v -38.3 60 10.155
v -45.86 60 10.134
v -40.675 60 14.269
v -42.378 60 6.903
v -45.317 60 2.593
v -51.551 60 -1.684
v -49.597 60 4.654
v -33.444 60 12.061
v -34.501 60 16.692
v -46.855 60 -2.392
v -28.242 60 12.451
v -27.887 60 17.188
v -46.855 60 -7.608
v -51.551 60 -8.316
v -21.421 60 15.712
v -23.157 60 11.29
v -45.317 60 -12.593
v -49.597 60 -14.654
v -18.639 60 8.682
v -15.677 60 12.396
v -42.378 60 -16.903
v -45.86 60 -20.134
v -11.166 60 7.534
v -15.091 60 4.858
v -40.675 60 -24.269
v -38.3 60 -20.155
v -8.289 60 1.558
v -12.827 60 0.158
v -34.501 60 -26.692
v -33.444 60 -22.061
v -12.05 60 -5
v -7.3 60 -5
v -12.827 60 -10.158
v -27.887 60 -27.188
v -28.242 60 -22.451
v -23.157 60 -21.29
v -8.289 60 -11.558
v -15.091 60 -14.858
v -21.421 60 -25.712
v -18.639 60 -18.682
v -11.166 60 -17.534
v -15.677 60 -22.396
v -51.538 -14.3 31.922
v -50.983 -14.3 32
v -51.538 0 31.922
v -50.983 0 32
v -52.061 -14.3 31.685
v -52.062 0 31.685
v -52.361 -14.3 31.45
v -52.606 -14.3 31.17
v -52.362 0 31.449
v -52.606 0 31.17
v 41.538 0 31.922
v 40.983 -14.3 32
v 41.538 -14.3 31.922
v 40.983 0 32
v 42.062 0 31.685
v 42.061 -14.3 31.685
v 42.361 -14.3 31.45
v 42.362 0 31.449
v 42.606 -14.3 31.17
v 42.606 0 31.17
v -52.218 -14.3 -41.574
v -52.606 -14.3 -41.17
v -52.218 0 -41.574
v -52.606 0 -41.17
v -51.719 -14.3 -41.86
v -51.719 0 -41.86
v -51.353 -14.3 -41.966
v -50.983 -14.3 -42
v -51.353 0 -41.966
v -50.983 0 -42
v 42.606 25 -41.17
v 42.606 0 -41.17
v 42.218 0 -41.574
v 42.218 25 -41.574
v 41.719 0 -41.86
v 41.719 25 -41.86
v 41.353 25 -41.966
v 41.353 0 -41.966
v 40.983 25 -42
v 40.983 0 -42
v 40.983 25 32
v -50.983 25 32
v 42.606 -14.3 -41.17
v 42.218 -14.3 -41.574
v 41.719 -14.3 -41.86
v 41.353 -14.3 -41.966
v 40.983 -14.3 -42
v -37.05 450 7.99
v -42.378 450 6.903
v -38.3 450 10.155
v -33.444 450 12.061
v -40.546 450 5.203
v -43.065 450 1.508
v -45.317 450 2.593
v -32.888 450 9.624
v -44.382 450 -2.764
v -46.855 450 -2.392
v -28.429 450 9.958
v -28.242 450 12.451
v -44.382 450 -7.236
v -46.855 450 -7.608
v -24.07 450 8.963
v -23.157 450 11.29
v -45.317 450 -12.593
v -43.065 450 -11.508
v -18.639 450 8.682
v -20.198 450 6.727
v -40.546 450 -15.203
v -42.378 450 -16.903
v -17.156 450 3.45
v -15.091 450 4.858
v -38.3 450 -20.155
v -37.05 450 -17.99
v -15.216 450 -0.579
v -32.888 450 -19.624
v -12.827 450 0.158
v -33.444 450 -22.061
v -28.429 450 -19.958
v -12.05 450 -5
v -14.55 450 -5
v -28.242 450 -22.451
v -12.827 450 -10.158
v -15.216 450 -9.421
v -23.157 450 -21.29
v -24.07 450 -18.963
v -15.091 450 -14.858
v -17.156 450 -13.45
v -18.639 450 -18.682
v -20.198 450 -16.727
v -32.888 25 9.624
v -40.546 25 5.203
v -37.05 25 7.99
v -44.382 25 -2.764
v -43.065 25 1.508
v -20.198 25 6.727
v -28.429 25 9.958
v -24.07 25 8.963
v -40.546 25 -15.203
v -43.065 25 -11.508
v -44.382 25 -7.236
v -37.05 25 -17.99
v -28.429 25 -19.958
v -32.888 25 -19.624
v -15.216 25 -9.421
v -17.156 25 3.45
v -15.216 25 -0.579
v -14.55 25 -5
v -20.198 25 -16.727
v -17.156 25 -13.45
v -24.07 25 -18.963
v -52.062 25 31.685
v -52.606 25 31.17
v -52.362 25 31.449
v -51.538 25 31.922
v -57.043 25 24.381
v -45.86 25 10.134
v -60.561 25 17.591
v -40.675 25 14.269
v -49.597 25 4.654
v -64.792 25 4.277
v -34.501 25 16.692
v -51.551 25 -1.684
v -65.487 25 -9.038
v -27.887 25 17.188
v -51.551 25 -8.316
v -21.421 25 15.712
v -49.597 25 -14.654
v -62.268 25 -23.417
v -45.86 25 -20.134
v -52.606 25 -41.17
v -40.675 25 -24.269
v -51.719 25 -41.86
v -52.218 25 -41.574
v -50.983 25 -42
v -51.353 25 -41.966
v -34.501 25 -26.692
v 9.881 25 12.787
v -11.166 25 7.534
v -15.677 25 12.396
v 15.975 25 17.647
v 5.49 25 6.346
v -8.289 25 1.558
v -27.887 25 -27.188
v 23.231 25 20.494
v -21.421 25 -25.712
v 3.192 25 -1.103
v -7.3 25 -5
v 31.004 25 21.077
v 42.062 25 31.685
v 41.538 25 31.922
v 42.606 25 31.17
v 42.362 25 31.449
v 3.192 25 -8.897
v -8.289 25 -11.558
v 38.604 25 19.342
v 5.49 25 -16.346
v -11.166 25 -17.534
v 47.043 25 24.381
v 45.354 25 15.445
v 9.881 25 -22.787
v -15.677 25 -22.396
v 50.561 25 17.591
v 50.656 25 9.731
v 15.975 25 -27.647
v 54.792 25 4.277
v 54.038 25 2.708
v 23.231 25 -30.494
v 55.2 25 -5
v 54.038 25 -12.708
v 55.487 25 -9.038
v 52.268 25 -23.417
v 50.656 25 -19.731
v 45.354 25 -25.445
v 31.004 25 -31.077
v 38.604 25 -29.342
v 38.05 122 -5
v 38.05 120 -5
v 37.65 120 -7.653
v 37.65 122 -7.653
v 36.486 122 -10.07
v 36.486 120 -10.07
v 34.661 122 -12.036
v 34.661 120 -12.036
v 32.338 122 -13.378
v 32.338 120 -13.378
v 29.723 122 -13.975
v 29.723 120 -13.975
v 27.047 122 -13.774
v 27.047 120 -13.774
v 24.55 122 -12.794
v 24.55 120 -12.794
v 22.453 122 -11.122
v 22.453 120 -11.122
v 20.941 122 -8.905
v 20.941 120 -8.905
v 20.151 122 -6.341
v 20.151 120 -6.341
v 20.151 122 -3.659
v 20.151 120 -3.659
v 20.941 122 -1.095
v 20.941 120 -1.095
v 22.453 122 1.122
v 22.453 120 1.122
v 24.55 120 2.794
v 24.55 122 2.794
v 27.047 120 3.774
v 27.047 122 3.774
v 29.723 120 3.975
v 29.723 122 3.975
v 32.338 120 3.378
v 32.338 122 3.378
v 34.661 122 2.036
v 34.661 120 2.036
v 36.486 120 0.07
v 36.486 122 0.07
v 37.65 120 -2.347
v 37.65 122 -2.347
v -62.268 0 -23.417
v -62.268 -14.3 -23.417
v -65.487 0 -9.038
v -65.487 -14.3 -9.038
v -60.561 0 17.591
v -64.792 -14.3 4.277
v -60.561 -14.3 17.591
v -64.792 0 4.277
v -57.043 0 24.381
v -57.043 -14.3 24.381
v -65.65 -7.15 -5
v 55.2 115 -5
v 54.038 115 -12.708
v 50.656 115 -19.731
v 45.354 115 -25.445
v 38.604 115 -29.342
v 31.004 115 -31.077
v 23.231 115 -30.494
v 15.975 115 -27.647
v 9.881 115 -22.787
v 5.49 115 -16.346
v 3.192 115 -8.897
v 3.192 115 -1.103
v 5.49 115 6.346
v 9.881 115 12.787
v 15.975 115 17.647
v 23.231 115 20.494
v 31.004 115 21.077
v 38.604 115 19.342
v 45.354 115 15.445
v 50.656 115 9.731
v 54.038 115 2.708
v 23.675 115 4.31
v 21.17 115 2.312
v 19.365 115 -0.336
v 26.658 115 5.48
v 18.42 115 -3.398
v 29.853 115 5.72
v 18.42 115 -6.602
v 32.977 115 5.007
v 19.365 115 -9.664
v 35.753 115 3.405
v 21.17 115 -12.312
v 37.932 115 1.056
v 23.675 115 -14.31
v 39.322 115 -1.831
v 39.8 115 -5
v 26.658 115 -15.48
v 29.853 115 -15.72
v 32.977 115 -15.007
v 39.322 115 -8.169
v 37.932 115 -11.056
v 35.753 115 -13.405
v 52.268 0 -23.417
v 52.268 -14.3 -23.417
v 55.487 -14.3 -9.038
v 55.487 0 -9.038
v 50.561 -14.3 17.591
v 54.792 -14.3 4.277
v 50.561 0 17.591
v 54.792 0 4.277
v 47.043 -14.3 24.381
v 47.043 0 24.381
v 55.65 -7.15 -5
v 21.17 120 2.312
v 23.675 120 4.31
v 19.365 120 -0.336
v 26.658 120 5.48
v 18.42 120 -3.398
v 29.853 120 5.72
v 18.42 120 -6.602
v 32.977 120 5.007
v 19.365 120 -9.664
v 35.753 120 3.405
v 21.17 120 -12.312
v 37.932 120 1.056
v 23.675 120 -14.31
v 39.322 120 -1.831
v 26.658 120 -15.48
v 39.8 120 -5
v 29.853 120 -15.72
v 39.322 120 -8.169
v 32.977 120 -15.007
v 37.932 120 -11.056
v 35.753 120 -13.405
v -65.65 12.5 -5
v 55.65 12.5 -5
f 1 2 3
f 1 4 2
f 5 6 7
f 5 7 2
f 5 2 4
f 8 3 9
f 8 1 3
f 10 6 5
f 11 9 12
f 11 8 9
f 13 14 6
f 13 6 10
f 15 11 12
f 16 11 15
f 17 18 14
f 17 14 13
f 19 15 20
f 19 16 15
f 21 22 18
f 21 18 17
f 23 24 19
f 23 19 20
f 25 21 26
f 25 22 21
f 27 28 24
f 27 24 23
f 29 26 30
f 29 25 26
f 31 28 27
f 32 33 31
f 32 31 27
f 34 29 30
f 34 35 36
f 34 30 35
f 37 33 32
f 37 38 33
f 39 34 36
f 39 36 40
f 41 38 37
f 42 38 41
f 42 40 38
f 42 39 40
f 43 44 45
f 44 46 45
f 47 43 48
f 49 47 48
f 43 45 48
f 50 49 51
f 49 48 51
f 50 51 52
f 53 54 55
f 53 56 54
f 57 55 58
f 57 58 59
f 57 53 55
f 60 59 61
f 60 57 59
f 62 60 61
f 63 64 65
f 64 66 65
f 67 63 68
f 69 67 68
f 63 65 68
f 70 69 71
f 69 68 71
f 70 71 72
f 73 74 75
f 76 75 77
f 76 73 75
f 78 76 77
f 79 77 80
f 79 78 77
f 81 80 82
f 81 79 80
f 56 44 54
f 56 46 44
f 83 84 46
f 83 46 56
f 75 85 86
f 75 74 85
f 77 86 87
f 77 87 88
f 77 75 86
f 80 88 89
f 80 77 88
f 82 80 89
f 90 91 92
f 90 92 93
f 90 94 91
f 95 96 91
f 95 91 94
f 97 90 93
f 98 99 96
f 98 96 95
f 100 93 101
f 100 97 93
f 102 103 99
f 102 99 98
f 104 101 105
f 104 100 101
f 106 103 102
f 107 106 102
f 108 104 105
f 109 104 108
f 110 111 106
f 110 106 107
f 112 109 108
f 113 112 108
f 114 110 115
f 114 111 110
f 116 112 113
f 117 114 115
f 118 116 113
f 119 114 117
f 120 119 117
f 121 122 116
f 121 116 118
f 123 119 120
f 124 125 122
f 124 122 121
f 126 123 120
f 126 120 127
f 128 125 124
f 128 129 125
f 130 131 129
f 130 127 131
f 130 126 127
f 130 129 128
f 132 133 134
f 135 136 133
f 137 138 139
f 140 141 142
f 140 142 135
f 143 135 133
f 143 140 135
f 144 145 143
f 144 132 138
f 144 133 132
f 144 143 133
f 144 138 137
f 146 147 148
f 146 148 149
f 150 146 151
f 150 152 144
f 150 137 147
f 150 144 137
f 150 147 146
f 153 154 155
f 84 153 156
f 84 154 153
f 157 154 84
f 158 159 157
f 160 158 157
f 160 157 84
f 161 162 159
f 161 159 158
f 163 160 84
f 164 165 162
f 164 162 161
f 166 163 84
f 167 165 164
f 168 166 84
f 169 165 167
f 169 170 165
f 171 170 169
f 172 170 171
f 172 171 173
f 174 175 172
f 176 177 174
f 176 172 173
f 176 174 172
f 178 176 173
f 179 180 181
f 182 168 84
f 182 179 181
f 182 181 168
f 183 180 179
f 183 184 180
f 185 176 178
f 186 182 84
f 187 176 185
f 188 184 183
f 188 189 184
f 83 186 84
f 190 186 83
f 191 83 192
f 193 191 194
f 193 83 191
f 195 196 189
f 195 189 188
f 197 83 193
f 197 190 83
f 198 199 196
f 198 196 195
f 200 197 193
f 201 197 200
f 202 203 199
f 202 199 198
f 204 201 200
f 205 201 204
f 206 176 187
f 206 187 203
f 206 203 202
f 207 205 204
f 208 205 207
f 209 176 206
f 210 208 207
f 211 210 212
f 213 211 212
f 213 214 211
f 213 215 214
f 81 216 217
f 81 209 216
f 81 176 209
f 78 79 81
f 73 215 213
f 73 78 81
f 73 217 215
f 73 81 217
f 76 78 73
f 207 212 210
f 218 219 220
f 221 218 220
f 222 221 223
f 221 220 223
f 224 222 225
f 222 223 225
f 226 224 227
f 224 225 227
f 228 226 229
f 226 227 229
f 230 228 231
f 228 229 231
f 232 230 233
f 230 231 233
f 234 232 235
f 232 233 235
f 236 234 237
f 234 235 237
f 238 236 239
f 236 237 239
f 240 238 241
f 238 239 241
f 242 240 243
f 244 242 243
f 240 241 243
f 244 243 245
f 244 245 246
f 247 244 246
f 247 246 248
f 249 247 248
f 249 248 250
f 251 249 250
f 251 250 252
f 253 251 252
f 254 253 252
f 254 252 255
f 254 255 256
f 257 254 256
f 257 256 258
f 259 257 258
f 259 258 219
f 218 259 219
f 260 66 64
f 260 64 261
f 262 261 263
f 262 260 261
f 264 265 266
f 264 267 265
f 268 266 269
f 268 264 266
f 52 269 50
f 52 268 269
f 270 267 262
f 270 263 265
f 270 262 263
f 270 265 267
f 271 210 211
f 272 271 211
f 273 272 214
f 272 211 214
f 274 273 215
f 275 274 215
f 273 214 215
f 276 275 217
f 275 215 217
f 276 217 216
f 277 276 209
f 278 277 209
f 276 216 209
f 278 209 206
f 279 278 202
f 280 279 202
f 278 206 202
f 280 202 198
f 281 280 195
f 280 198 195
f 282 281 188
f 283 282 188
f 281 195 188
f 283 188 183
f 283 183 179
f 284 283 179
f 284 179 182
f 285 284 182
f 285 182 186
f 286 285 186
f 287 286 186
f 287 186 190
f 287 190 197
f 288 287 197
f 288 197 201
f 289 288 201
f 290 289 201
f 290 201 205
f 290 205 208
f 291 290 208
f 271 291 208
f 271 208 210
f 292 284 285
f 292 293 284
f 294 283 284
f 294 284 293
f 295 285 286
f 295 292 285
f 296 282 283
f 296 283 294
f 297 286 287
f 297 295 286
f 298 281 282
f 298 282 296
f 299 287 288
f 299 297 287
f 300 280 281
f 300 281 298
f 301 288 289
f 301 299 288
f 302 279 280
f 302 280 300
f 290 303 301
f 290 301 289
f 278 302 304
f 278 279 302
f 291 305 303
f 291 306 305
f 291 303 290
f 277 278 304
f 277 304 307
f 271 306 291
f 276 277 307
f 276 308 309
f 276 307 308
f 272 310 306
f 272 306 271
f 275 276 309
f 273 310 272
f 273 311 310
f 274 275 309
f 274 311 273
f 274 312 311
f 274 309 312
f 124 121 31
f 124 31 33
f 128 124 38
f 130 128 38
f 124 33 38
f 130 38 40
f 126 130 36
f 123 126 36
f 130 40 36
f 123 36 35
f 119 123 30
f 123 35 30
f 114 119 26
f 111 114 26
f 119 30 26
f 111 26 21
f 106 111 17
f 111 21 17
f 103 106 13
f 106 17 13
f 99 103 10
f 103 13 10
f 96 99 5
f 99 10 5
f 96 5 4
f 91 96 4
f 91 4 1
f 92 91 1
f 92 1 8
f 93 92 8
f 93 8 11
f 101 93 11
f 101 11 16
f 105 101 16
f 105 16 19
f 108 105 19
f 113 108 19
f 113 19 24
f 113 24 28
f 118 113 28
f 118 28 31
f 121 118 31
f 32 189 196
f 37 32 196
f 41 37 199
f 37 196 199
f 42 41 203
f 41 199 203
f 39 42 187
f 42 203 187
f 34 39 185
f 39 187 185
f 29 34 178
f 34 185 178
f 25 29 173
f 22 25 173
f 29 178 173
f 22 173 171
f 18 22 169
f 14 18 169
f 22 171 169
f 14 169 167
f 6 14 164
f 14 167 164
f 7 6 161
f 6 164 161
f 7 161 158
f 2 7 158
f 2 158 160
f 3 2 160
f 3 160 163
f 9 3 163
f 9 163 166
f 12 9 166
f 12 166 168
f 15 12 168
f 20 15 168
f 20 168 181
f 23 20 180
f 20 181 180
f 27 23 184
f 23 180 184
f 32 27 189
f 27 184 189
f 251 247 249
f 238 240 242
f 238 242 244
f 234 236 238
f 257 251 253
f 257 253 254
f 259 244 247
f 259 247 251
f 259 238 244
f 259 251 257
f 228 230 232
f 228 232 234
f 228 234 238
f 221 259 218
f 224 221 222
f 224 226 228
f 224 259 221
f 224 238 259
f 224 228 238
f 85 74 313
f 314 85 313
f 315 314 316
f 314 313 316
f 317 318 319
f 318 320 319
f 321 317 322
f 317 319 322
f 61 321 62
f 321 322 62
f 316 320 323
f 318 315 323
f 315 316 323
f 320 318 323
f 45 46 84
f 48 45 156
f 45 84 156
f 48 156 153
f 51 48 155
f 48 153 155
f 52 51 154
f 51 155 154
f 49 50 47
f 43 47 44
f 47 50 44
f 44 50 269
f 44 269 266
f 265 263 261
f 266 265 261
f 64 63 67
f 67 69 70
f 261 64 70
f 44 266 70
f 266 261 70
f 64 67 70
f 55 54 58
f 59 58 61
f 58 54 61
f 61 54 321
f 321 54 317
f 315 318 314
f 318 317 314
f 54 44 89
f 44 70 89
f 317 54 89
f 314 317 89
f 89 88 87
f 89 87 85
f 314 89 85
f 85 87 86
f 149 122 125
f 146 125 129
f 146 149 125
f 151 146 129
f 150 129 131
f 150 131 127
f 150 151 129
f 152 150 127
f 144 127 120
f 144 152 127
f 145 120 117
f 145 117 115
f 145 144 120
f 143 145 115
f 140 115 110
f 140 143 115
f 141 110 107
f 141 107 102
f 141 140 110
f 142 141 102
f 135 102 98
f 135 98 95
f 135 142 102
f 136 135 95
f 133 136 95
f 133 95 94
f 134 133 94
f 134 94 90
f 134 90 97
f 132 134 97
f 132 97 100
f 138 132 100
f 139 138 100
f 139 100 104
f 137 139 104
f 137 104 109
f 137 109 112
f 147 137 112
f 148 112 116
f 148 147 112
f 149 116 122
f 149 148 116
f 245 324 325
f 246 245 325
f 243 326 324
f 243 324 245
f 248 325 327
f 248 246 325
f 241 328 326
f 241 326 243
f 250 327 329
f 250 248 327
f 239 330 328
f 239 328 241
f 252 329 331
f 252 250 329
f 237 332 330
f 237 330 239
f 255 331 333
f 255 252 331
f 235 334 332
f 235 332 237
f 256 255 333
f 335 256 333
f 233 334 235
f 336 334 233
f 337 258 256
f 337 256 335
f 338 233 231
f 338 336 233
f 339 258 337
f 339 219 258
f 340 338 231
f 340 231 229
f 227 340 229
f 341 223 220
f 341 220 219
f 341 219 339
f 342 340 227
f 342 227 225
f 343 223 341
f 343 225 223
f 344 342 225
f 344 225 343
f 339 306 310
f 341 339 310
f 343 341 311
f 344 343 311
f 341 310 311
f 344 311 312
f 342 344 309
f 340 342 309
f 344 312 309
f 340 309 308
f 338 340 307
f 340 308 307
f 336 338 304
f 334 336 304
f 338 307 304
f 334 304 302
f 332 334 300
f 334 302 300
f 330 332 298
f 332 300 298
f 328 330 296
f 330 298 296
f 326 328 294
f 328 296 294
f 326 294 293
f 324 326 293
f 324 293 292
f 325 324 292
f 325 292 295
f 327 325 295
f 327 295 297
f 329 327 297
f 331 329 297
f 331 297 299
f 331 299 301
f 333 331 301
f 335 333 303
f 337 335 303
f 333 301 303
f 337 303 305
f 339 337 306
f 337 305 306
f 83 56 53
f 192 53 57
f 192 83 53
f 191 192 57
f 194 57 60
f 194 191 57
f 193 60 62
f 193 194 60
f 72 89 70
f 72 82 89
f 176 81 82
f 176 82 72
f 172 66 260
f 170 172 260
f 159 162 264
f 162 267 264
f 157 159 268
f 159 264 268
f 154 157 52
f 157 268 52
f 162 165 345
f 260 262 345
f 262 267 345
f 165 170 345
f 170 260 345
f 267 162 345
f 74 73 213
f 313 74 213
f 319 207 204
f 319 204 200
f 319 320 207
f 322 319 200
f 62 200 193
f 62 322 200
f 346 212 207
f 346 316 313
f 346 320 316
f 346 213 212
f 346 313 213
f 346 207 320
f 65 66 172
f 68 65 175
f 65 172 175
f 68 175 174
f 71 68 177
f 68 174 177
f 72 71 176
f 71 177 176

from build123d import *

# Parameters (mm, degrees)
BOSS_EXTRUDE3_DEPTH      = 25
BOSS_EXTRUDE3_DEPTH_BACK = 14.3
SKETCH6_R                = 26.15
BOSS_EXTRUDE4_DEPTH      = 90
SKETCH7_R                = 10.75
SKETCH7_R_2              = 8.15
BOSS_EXTRUDE5_DEPTH      = 5
SKETCH8_R                = 9
BOSS_EXTRUDE6_DEPTH      = 7
SKETCH9_R                = 22.25
SKETCH9_R_2              = 17.5
SKETCH9_R_3              = 26.15
BOSS_EXTRUDE7_DEPTH      = 35
SKETCH10_R               = 17.5
SKETCH10_R_2             = 15
BOSS_EXTRUDE8_DEPTH      = 425
FILLET1_R                = 2


with BuildPart() as part:
    # Sketch5 → Boss-Extrude3 (new body, two sides)
    with BuildSketch(Plane(origin=(0, 0, 0), x_dir=(1, 0, 0), z_dir=(0, 1, 0))) as boss_extrude3_sk:
        with BuildLine():
            Line((-52, -32), (42, -32))
            add(Edge.make_bspline(
                [(42, 42), (69.3, 5), (42, -32)],
                knots=[0, 0, 0, 1, 1, 1], degree=2))
            Line((42, 42), (-52, 42))
            add(Edge.make_bspline(
                [(-52, 42), (-79.3, 5), (-52, -32)],
                knots=[0, 0, 0, 1, 1, 1], degree=2))
        make_face()
    extrude(amount=BOSS_EXTRUDE3_DEPTH)
    extrude(boss_extrude3_sk.sketch, amount=-BOSS_EXTRUDE3_DEPTH_BACK)

    # Sketch6 → Boss-Extrude4 (add)
    with BuildSketch(Plane(origin=(0, 25, 0), x_dir=(1, 0, 0), z_dir=(0, 1, 0))):
        with Locations((29.05, 5)):
            Circle(SKETCH6_R)
    extrude(amount=BOSS_EXTRUDE4_DEPTH)

    # Sketch7 → Boss-Extrude5 (add)
    with BuildSketch(Plane(origin=(0, 115, 0), x_dir=(1, 0, 0), z_dir=(0, 1, 0))):
        with Locations((29.05, 5)):
            Circle(SKETCH7_R)
        with Locations((29.05, 5)):
            Circle(SKETCH7_R_2, mode=Mode.SUBTRACT)
    extrude(amount=BOSS_EXTRUDE5_DEPTH)

    # Sketch8 → Boss-Extrude6 (add)
    with BuildSketch(Plane(origin=(0, 115, 0), x_dir=(1, 0, 0), z_dir=(0, 1, 0))):
        with Locations((29.05, 5)):
            Circle(SKETCH8_R)
    extrude(amount=BOSS_EXTRUDE6_DEPTH)

    # Sketch9 → Boss-Extrude7 (add)
    with BuildSketch(Plane(origin=(0, 25, 0), x_dir=(1, 0, 0), z_dir=(0, 1, 0))):
        with Locations((-29.55, 5)):
            Circle(SKETCH9_R)
        with Locations((-29.55, 5)):
            Circle(SKETCH9_R_2, mode=Mode.SUBTRACT)
        with Locations((29.05, 5)):
            Circle(SKETCH9_R_3)
    extrude(amount=BOSS_EXTRUDE7_DEPTH)

    # Sketch10 → Boss-Extrude8 (add)
    with BuildSketch(Plane(origin=(0, 25, 0), x_dir=(1, 0, 0), z_dir=(0, 1, 0))):
        with Locations((-29.55, 5)):
            Circle(SKETCH10_R)
        with Locations((-29.55, 5)):
            Circle(SKETCH10_R_2, mode=Mode.SUBTRACT)
    extrude(amount=BOSS_EXTRUDE8_DEPTH)

    # Fillet1
    fillet1_edges = [part.edges().sort_by_distance(p)[0] for p in [
        (42, 12.5, -42),
        (-52, 12.5, -42),
        (-52, 12.5, 32),
        (42, 12.5, 32),
    ]]
    fillet(fillet1_edges, radius=FILLET1_R)


solid = part.part
